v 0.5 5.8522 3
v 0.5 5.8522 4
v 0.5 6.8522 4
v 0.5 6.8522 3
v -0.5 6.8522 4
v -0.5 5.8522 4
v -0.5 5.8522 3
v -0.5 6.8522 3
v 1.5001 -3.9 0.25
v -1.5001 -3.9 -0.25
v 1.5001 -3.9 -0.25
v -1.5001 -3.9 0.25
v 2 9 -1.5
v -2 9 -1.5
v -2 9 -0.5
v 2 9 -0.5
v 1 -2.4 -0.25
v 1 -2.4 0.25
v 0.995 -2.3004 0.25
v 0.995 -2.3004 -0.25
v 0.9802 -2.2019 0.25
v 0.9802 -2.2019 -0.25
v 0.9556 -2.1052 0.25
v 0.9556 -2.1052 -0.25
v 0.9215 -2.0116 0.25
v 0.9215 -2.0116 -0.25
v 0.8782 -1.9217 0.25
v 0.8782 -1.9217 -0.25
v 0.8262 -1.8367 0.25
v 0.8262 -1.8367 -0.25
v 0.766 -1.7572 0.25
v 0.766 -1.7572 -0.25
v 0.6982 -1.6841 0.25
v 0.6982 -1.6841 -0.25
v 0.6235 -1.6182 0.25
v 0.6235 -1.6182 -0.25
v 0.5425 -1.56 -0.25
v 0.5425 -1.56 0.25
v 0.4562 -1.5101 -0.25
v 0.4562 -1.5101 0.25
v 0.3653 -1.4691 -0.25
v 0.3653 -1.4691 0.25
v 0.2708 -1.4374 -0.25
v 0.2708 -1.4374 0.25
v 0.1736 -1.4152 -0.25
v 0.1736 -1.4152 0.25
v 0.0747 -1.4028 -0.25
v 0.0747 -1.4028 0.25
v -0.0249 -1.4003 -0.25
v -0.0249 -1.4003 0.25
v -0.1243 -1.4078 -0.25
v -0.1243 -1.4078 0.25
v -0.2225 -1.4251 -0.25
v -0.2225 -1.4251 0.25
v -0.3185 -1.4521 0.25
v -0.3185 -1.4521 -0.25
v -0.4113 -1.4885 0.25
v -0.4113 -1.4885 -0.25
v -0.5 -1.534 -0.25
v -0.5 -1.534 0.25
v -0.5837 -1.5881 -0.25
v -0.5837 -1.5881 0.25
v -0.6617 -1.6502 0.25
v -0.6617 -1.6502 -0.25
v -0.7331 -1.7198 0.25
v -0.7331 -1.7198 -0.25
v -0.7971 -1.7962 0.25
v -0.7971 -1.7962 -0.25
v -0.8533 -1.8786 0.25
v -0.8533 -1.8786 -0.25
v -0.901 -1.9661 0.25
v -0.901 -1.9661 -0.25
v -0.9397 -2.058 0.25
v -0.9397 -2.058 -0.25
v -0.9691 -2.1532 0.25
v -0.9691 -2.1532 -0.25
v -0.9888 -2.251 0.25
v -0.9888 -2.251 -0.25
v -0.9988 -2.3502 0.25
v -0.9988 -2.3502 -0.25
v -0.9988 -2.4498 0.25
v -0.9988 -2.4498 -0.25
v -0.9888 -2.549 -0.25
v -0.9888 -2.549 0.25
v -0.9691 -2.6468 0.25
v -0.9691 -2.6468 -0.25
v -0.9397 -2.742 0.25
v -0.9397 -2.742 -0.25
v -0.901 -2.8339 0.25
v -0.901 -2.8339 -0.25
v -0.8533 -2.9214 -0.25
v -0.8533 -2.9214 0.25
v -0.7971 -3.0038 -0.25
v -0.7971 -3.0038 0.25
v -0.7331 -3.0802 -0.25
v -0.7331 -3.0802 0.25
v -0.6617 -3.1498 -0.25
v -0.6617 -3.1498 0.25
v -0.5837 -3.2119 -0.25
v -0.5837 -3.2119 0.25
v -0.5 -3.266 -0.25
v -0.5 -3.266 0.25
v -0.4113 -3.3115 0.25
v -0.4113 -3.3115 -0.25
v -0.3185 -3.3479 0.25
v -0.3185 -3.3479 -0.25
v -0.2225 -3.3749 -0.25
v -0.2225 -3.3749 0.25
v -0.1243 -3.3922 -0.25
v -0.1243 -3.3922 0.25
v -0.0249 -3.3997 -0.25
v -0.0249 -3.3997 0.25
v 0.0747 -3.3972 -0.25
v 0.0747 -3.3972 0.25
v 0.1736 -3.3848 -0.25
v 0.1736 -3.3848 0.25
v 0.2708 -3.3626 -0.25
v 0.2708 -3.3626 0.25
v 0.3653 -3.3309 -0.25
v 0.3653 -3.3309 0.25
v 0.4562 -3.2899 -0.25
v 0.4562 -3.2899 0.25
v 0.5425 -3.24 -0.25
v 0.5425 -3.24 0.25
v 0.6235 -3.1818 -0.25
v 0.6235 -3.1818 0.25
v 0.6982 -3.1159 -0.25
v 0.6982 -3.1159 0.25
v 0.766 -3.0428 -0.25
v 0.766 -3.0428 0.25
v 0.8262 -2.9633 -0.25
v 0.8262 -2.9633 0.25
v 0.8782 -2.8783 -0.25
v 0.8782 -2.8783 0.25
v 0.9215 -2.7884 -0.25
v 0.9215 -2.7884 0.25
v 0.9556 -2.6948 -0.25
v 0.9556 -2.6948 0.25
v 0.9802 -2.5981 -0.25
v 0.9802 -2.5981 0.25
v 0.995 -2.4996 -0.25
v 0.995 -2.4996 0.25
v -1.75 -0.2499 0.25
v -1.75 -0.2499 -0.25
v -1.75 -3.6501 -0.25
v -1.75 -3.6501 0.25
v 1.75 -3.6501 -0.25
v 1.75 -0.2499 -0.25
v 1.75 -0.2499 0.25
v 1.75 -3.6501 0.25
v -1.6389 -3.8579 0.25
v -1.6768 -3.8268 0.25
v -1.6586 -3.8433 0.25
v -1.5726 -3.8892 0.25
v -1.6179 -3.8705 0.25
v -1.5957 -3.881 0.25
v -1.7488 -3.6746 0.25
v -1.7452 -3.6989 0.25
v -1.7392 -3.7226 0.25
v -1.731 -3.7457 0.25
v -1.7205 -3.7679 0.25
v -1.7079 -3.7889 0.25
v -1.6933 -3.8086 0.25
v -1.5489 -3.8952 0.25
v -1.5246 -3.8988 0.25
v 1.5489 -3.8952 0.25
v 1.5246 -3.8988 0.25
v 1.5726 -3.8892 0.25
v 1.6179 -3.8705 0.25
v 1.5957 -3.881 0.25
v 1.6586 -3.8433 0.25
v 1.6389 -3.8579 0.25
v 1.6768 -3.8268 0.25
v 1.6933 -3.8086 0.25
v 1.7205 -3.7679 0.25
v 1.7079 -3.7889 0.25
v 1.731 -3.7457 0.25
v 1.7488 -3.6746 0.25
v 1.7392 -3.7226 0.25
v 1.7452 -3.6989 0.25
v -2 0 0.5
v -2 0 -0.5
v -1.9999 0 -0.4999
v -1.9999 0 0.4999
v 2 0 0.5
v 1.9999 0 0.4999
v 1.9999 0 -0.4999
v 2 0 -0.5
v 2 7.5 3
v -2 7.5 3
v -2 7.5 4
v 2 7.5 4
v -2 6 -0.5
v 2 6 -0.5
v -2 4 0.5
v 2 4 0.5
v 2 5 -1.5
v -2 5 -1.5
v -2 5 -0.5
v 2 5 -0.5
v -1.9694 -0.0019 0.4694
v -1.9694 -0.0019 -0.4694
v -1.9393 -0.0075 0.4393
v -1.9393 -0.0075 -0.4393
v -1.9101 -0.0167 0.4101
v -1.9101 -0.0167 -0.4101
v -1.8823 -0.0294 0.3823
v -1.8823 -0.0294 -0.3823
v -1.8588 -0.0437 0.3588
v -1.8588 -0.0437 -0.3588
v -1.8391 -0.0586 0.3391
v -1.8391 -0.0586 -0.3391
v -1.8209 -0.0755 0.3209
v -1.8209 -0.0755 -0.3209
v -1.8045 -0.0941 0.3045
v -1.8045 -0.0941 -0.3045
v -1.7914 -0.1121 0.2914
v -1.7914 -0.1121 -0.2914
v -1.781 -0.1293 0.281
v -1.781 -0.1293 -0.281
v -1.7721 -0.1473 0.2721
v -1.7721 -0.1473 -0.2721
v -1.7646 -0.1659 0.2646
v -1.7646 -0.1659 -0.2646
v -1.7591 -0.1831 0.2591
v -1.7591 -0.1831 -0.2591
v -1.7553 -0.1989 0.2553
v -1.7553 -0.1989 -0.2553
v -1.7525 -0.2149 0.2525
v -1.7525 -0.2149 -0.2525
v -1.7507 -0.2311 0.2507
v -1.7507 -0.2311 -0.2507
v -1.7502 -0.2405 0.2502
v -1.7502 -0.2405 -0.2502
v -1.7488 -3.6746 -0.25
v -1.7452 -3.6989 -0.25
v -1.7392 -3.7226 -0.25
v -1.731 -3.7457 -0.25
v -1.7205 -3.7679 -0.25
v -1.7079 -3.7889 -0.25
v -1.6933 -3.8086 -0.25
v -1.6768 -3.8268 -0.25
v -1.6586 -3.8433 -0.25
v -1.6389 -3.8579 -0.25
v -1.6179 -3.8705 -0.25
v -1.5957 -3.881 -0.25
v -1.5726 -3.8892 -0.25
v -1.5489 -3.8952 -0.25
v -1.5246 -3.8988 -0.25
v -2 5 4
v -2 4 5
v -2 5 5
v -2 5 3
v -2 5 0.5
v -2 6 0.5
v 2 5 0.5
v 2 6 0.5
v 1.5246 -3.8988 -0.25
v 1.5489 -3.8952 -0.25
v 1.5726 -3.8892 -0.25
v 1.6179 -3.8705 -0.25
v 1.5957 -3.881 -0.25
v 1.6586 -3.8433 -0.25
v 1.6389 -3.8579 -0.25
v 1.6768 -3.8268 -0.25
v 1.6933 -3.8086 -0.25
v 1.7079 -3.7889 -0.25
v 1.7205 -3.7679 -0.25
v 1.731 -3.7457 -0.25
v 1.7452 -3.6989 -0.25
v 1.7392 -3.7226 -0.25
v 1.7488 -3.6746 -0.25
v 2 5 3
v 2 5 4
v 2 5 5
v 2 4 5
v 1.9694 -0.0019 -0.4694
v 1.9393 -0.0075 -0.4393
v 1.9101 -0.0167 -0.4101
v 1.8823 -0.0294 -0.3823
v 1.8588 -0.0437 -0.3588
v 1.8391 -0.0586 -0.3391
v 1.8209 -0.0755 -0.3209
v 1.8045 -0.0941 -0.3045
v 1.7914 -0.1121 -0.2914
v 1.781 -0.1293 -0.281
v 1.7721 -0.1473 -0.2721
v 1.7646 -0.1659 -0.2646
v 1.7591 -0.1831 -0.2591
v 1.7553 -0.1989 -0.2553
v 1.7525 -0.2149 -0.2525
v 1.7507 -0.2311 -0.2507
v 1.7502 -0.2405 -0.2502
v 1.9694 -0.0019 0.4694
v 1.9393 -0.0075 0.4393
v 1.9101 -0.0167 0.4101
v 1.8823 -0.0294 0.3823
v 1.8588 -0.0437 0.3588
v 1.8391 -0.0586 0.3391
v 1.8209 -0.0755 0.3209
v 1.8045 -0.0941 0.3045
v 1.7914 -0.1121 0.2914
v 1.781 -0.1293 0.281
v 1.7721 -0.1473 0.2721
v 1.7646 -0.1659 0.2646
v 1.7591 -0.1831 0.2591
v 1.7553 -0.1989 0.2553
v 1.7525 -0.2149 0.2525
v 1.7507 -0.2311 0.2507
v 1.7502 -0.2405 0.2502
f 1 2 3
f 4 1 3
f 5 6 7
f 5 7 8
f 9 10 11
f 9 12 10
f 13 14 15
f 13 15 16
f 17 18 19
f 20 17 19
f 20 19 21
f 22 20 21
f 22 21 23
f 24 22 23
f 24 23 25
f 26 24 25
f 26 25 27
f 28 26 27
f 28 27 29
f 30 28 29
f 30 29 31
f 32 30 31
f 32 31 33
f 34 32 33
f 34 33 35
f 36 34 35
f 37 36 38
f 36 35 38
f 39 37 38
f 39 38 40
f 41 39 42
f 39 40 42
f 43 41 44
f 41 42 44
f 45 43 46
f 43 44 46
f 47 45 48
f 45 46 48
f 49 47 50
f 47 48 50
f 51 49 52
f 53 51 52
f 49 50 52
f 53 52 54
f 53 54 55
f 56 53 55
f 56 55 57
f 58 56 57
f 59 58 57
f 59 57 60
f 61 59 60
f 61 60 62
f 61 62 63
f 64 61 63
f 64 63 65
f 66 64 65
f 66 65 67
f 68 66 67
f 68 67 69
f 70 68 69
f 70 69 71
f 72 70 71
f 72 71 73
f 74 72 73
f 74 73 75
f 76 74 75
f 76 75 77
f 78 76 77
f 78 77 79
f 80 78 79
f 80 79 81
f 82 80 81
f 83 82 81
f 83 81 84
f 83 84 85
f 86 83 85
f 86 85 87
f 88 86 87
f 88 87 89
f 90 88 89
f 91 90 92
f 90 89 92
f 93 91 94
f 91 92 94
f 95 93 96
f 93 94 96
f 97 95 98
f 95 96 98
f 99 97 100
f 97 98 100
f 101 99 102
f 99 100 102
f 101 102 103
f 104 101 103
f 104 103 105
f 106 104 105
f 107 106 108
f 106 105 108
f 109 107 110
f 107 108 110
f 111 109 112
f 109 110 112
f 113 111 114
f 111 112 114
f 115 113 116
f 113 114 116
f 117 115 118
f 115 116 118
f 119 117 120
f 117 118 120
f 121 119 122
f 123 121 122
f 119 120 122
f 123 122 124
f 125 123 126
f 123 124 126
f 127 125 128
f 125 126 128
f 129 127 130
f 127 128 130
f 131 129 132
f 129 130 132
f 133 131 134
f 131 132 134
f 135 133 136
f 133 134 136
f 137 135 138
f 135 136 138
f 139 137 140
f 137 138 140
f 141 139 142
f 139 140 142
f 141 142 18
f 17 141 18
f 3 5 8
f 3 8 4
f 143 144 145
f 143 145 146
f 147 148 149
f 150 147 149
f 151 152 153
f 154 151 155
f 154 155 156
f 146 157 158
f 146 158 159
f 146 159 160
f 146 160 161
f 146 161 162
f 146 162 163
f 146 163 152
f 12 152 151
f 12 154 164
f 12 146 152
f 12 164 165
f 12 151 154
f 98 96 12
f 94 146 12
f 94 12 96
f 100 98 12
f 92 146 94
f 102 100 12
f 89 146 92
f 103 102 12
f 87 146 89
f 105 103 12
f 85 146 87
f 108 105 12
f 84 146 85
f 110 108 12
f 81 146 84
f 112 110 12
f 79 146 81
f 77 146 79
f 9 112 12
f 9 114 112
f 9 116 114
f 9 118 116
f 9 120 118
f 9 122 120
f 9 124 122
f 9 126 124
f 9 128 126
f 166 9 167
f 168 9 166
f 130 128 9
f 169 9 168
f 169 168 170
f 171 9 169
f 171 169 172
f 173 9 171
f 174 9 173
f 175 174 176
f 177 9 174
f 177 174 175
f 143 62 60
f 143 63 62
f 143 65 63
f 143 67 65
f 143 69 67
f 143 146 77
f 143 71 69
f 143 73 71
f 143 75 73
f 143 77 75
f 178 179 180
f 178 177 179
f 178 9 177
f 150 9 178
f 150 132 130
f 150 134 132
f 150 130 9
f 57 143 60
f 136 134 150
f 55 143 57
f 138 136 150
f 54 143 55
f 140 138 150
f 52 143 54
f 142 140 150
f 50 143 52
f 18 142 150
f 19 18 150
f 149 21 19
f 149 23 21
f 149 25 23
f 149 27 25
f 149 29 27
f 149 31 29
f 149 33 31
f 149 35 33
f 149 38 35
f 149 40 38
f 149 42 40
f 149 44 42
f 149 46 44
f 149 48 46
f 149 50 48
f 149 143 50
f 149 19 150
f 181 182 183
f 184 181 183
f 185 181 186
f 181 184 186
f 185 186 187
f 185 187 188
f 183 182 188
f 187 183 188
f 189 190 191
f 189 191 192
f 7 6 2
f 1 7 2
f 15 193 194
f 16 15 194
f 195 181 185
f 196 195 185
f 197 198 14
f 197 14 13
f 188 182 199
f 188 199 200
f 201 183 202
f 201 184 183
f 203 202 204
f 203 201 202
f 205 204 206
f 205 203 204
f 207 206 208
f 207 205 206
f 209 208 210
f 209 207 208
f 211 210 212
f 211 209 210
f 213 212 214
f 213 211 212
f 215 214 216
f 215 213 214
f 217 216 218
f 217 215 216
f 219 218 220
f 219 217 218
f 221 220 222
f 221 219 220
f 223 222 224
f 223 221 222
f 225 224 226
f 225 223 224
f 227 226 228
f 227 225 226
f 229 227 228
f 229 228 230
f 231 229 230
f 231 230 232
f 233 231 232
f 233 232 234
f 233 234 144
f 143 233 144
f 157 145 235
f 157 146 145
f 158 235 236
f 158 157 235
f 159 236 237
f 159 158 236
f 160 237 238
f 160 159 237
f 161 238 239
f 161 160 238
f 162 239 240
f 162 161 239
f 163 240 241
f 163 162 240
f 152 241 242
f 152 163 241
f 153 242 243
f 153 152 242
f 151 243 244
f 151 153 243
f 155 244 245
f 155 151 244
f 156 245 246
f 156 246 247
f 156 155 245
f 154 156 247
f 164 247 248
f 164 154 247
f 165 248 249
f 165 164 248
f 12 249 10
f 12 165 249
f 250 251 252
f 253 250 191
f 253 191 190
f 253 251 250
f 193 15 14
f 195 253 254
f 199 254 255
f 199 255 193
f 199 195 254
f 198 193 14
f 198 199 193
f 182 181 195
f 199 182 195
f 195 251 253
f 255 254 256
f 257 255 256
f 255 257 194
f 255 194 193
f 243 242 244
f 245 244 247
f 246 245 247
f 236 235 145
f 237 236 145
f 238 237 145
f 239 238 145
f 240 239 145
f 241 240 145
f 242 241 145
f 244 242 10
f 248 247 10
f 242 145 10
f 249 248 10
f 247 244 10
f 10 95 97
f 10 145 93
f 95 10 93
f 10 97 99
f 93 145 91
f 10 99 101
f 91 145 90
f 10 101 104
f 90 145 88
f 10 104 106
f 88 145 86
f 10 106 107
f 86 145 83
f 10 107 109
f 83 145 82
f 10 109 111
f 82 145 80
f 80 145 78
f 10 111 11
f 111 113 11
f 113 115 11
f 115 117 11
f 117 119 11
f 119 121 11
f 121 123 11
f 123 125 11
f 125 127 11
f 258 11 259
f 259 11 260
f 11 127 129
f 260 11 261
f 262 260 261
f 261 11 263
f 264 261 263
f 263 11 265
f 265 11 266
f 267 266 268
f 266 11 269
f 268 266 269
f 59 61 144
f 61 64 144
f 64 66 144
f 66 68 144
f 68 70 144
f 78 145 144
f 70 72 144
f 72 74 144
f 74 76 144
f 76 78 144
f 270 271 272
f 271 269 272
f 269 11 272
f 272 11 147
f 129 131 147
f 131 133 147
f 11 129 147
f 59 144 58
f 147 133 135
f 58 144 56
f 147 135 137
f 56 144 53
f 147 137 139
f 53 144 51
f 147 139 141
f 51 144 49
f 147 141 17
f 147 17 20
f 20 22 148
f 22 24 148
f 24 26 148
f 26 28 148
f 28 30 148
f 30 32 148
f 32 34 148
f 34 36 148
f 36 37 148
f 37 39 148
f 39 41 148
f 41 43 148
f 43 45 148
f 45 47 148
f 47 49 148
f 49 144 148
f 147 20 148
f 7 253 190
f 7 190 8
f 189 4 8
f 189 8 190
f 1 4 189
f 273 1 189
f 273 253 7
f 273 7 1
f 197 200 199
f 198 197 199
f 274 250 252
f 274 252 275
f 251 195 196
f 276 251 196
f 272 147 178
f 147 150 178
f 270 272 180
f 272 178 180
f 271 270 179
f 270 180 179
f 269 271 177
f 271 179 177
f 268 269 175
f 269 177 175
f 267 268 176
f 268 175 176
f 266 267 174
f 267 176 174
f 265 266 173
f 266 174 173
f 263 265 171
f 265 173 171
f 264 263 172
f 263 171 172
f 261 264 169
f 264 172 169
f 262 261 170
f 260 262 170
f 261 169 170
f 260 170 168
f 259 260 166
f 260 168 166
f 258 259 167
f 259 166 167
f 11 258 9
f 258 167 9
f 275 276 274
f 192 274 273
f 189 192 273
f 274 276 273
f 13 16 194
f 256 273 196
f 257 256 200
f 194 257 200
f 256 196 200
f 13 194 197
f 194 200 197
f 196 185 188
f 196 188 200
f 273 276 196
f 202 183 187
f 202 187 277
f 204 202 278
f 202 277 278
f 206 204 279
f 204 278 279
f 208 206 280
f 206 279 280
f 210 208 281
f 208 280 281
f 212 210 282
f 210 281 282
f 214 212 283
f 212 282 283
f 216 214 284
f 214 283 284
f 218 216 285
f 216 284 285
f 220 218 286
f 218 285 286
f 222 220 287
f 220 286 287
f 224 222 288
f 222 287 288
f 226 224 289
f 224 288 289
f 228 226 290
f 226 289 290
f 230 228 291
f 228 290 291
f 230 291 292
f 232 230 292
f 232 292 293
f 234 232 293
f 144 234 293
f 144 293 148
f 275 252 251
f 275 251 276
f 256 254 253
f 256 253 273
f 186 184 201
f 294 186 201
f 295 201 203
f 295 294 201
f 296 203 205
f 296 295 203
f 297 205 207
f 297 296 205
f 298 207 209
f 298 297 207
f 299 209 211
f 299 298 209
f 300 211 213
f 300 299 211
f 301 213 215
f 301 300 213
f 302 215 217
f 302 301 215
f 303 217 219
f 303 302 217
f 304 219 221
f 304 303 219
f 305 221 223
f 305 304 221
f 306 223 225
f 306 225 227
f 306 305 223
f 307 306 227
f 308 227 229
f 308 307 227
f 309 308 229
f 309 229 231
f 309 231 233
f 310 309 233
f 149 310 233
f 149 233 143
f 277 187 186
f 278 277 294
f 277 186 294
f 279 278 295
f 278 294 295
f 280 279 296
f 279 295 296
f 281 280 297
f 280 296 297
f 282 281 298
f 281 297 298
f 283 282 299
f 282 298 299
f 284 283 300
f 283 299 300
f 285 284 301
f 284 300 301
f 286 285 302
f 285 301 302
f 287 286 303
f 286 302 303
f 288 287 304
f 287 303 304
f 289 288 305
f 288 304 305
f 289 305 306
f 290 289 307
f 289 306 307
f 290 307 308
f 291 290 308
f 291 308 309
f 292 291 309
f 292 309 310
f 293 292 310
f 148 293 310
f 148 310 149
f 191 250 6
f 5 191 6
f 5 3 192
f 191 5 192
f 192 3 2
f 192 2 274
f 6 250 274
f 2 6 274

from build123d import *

# Parameters (mm, degrees)
SZKIC1_W                    = 4
SZKIC1_H                    = 1
DODANIE_WYCI_GNI_CIE1_DEPTH = 5
SZKIC2_W                    = 4
SZKIC2_H                    = 1
DODANIE_WYCI_GNI_CIE2_DEPTH = 4.5
SZKIC3_W                    = 4
SZKIC3_H                    = 1
DODANIE_WYCI_GNI_CIE3_DEPTH = 1
SZKIC4_W                    = 4
SZKIC4_H                    = 1
DODANIE_WYCI_GNI_CIE4_DEPTH = 1
SZKIC5_W                    = 4
SZKIC5_H                    = 1
DODANIE_WYCI_GNI_CIE5_DEPTH = 3
SZKIC6_W                    = 4
SZKIC6_H                    = 1
DODANIE_WYCI_GNI_CIE6_DEPTH = 2.5
SZKIC8_W                    = 3.5
SZKIC8_H                    = 0.5
DODANIE_WYCI_GNI_CIE7_DEPTH = 3.9
SZKIC9_R                    = 1
WYTNIJ_WYCI_GNI_CIE2_DEPTH  = 3.9
ZAOKR_GLENIE1_R             = 0.25
SZKIC10_W                   = 1
SZKIC10_H                   = 1
WYTNIJ_WYCI_GNI_CIE3_DEPTH  = 1


with BuildPart() as part:
    # Szkic1 → Dodanie-wyciągnięcie1 (new body)
    with BuildSketch(Plane(origin=(0, 0, 0), x_dir=(1, 0, 0), z_dir=(0, 1, 0))):
        Rectangle(SZKIC1_W, SZKIC1_H)
    extrude(amount=DODANIE_WYCI_GNI_CIE1_DEPTH)

    # Szkic2 → Dodanie-wyciągnięcie2 (add)
    with BuildSketch(Plane.XY.offset(0.5)):
        with Locations((0, 4.5)):
            Rectangle(SZKIC2_W, SZKIC2_H)
    extrude(amount=DODANIE_WYCI_GNI_CIE2_DEPTH)

    # Szkic3 → Dodanie-wyciągnięcie3 (add)
    with BuildSketch(Plane(origin=(0, 5, 0), x_dir=(1, 0, 0), z_dir=(0, 1, 0))):
        Rectangle(SZKIC3_W, SZKIC3_H)
    extrude(amount=DODANIE_WYCI_GNI_CIE3_DEPTH)

    # Szkic4 → Dodanie-wyciągnięcie4 (add)
    with BuildSketch(Plane(origin=(0, 0, -0.5), x_dir=(-1, 0, 0), z_dir=(0, 0, -1))):
        with Locations((0, 5.5)):
            Rectangle(SZKIC4_W, SZKIC4_H)
    extrude(amount=DODANIE_WYCI_GNI_CIE4_DEPTH)

    # Szkic5 → Dodanie-wyciągnięcie5 (add)
    with BuildSketch(Plane(origin=(0, 6, 0), x_dir=(1, 0, 0), z_dir=(0, 1, 0))):
        with Locations((0, 1)):
            Rectangle(SZKIC5_W, SZKIC5_H)
    extrude(amount=DODANIE_WYCI_GNI_CIE5_DEPTH)

    # Szkic6 → Dodanie-wyciągnięcie6 (add)
    with BuildSketch(Plane(origin=(0, 5, 0), x_dir=(1, 0, 0), z_dir=(0, 1, 0))):
        with Locations((0, -3.5)):
            Rectangle(SZKIC6_W, SZKIC6_H)
    extrude(amount=DODANIE_WYCI_GNI_CIE6_DEPTH)

    # Szkic8 → Dodanie-wyciągnięcie7 (add)
    with BuildSketch(Plane.XZ):
        Rectangle(SZKIC8_W, SZKIC8_H)
    extrude(amount=DODANIE_WYCI_GNI_CIE7_DEPTH)

    # Szkic9 → Wytnij-wyciągnięcie2 (cut)
    with BuildSketch(Plane.XY.offset(0.25)):
        with Locations((0, -2.4)):
            Circle(SZKIC9_R)
    extrude(amount=-WYTNIJ_WYCI_GNI_CIE2_DEPTH, mode=Mode.SUBTRACT)

    # Zaokrąglenie1
    zaokr_glenie1_edges = [part.edges().sort_by_distance(p)[0] for p in [
        (-1.75, 0, 0),
        (0, 0, -0.25),
        (1.75, 0, 0),
        (0, 0, 0.25),
        (-1.75, -3.9, 0),
        (1.75, -3.9, 0),
    ]]
    fillet(zaokr_glenie1_edges, radius=ZAOKR_GLENIE1_R - 0.0001)  # a hair under: the kernel refuses the full size

    # Szkic10 → Wytnij-wyciągnięcie3 (cut)
    with BuildSketch(Plane.XY.offset(4)):
        with Locations((0, 6.352223481)):
            Rectangle(SZKIC10_W, SZKIC10_H)
    extrude(amount=-WYTNIJ_WYCI_GNI_CIE3_DEPTH, mode=Mode.SUBTRACT)


solid = part.part
